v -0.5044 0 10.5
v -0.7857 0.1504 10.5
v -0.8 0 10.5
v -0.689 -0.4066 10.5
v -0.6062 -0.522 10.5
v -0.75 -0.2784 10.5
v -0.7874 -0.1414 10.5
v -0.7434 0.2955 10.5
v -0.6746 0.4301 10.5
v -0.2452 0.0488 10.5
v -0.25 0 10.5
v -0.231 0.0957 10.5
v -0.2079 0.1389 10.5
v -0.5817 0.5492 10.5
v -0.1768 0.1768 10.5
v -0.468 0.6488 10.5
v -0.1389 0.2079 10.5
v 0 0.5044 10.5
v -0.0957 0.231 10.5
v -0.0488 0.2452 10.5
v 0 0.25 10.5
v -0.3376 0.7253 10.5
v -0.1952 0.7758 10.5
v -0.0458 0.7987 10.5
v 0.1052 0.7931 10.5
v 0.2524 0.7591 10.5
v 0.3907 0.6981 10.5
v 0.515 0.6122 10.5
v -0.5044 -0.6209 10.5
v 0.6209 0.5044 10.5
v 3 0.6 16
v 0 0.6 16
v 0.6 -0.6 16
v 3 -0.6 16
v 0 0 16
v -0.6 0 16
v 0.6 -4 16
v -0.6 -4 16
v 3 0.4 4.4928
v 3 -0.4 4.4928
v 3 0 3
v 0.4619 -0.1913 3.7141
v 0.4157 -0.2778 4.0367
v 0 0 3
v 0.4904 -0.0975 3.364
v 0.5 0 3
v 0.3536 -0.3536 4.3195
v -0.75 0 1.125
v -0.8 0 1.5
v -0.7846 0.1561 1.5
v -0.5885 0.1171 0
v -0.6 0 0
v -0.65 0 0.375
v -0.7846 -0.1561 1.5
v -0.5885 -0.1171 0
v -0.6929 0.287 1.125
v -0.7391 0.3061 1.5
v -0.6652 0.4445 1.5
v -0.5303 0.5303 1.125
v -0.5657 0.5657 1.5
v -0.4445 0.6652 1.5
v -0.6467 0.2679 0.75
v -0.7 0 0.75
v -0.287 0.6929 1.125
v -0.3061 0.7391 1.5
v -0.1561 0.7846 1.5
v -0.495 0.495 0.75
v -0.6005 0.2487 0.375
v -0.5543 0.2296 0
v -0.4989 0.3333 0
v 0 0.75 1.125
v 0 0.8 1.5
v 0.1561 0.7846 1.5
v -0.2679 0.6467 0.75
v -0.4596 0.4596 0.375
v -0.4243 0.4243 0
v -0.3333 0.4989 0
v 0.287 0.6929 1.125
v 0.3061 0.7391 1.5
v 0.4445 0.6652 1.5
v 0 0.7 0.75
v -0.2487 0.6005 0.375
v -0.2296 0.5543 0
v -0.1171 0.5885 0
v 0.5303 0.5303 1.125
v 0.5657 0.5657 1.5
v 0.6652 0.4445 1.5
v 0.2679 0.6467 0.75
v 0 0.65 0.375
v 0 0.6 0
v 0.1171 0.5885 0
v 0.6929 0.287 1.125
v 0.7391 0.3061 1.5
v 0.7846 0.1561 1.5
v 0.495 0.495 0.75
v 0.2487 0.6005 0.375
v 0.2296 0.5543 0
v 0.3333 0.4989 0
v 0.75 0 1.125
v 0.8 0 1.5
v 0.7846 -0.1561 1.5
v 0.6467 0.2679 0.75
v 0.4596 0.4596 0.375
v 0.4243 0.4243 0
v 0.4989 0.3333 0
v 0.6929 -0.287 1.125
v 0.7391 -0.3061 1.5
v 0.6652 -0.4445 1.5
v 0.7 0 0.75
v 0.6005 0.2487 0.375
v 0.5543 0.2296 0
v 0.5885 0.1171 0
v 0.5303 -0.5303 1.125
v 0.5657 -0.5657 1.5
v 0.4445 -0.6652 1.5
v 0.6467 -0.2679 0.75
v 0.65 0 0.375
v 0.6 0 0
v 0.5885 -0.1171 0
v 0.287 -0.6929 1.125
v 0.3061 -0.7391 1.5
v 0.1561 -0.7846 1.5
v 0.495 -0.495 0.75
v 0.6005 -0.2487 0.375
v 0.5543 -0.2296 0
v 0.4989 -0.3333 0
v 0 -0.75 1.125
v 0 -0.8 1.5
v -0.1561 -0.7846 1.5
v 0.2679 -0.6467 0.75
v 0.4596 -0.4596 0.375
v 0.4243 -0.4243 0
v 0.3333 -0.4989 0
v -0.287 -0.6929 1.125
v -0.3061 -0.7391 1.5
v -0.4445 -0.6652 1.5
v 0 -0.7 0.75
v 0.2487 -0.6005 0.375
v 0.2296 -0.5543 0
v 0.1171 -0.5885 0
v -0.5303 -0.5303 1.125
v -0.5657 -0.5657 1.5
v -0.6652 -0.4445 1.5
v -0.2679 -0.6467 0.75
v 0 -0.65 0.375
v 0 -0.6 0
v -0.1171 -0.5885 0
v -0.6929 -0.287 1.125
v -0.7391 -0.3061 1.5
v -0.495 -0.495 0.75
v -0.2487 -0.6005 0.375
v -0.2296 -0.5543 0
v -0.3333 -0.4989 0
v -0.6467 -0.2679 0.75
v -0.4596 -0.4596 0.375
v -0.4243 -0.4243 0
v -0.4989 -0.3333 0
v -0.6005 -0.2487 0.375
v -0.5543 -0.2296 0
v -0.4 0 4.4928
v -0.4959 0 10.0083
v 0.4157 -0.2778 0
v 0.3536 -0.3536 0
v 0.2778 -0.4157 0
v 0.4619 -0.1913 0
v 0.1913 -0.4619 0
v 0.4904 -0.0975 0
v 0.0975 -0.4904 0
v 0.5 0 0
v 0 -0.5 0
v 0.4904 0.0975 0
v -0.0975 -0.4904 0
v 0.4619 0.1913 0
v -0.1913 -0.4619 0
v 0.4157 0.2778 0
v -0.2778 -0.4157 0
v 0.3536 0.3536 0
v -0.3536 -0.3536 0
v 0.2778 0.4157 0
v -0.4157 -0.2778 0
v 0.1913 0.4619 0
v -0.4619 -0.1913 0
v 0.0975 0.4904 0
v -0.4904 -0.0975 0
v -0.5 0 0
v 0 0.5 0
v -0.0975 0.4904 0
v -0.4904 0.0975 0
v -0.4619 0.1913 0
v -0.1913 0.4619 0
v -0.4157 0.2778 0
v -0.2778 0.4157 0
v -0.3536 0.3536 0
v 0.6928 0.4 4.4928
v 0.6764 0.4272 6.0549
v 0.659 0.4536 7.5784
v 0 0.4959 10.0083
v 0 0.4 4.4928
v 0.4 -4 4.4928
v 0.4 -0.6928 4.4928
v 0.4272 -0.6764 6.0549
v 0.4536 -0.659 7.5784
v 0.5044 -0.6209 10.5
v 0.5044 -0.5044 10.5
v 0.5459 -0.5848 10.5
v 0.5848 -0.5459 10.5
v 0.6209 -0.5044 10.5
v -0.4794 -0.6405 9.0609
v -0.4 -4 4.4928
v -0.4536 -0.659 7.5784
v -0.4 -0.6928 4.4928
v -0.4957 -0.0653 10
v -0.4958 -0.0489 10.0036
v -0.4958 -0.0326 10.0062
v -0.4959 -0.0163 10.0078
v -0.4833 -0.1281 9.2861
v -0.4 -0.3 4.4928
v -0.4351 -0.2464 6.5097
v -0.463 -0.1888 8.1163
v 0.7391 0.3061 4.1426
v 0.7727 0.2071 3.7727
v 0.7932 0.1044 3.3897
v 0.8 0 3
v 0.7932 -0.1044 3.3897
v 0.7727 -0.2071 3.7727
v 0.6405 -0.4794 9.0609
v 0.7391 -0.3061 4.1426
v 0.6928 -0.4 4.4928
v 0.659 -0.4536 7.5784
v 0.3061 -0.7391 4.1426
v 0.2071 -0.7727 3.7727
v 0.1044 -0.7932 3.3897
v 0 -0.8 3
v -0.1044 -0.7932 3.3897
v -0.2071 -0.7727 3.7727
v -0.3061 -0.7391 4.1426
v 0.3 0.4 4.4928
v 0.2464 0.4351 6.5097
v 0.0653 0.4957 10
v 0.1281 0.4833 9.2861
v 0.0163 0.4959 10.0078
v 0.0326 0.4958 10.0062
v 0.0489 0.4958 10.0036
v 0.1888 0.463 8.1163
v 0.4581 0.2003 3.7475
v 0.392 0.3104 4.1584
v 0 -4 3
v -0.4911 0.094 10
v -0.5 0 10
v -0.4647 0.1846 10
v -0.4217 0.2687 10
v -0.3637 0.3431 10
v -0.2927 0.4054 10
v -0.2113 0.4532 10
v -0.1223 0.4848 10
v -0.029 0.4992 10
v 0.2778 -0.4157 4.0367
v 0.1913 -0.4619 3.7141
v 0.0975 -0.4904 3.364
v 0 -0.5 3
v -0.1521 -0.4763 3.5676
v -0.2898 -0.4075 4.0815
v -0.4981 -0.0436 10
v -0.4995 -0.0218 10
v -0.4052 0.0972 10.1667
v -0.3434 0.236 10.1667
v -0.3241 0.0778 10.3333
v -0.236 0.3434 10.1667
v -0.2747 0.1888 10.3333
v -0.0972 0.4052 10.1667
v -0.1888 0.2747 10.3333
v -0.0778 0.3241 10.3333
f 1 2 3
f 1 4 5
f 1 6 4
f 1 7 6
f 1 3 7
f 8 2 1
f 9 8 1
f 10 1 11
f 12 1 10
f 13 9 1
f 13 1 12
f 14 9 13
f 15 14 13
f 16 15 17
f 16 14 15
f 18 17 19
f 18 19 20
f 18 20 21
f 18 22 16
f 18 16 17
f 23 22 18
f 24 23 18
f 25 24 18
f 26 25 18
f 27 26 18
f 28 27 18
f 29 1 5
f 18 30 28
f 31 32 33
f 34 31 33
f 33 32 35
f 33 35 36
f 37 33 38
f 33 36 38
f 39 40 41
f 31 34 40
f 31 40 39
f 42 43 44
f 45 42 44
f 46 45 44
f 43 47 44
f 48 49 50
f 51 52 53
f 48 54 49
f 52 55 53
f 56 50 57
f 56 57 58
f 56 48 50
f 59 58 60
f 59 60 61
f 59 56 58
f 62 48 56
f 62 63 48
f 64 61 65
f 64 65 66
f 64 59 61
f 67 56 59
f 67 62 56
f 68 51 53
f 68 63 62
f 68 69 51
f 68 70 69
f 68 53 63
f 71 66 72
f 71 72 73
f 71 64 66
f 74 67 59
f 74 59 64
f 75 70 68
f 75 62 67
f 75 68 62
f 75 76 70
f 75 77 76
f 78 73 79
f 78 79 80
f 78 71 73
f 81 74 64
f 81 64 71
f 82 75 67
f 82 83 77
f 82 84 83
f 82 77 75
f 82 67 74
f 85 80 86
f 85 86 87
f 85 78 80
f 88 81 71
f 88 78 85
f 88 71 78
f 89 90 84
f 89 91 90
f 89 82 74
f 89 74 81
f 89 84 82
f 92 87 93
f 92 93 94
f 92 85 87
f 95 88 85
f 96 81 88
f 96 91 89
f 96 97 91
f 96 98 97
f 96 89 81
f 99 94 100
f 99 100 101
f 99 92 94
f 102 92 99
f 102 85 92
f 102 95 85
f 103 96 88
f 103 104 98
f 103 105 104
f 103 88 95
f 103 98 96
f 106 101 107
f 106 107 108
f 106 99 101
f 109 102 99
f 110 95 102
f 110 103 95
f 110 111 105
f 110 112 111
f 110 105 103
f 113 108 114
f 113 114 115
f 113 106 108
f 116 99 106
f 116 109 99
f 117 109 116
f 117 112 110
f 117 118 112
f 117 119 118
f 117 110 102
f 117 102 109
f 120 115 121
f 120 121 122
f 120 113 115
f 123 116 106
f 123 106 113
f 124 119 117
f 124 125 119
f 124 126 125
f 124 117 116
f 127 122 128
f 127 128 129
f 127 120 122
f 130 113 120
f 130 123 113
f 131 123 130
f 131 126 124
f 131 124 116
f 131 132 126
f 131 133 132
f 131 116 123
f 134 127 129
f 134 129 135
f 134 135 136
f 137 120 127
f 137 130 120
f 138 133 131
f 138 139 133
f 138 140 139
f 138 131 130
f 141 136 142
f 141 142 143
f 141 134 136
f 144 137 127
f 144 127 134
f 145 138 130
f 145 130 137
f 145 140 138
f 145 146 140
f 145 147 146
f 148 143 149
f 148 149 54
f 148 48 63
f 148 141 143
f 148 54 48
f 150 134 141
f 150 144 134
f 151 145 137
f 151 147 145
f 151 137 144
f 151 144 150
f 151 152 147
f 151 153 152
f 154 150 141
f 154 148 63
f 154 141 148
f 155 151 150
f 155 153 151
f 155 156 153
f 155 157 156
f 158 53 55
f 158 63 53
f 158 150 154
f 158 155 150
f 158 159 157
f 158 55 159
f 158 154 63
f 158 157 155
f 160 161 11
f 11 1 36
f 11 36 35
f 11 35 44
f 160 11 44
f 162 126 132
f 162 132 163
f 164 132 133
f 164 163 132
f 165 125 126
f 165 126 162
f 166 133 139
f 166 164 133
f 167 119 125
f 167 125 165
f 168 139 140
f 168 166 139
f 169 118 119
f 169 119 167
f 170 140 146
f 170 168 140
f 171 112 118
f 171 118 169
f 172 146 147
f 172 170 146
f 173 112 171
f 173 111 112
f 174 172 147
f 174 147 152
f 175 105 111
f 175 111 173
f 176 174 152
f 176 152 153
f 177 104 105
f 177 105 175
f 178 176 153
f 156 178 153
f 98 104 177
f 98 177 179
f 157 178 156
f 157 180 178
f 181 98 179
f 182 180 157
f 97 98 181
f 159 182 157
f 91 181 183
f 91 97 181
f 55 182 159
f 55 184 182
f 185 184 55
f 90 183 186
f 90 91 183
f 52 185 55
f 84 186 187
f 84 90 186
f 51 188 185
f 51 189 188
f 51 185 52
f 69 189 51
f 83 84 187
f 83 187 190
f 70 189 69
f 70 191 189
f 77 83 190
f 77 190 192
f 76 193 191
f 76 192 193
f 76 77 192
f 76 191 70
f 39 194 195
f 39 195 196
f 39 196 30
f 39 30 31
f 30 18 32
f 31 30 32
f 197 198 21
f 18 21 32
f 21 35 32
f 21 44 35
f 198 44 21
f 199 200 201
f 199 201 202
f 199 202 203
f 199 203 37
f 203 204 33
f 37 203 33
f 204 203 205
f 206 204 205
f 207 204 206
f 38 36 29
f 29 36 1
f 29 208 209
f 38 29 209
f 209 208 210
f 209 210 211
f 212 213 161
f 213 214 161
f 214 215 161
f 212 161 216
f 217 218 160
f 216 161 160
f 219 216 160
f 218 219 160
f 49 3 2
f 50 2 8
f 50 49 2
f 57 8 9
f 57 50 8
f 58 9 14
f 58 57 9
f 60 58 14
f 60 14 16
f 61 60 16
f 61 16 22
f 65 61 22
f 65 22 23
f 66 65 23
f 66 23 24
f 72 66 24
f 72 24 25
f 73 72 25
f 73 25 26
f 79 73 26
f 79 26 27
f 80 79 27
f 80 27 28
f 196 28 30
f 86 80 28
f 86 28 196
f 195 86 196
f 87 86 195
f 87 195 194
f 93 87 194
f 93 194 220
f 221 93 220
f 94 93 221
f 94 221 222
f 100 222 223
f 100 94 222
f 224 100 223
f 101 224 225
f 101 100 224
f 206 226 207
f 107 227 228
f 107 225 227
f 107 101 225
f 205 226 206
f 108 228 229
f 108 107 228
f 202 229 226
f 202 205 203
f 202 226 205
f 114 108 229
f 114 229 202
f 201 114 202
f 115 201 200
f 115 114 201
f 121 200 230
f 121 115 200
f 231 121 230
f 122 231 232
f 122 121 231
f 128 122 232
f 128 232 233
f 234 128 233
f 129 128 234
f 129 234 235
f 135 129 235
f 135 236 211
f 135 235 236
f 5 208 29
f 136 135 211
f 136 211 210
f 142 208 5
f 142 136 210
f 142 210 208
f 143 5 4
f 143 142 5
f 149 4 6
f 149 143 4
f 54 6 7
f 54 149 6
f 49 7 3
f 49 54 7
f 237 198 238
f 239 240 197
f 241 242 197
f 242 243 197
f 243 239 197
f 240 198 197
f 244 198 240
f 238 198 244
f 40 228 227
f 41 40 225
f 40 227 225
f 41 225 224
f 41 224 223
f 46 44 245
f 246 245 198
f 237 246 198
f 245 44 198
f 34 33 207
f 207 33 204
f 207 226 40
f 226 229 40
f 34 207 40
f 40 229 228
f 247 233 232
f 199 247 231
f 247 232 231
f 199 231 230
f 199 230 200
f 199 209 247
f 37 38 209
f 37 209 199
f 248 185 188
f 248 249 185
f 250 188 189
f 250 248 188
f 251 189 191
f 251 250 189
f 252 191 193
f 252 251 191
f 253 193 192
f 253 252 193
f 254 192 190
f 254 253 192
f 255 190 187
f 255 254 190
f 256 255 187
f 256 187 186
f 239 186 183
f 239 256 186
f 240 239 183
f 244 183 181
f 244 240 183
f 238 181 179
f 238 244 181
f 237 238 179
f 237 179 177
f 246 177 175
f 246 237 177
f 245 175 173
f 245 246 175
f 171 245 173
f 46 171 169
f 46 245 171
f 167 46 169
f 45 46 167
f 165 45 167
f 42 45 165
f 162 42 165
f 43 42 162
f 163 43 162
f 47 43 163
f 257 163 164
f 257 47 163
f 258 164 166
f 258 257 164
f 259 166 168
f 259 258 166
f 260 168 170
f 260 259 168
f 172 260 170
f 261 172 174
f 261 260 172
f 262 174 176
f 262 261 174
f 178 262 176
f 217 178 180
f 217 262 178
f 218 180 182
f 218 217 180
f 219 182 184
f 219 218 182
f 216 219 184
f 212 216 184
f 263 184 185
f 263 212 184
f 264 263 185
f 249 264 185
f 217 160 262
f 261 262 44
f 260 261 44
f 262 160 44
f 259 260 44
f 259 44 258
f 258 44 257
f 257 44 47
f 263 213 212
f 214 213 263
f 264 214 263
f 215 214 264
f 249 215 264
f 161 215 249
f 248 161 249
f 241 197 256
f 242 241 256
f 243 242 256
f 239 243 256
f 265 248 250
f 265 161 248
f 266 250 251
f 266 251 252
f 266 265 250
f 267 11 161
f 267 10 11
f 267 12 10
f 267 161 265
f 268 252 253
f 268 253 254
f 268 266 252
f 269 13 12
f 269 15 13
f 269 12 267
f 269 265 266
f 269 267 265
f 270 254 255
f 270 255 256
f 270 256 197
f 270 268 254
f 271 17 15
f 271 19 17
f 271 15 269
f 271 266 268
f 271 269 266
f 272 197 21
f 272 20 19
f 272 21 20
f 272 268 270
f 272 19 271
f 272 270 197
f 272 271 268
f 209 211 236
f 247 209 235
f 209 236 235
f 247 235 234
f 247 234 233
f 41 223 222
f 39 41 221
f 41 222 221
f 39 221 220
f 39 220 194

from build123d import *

# Parameters (mm, degrees)
F3_DEPTH = 4
F5_DEPTH = 3


with BuildPart() as f1:
    # F0 (on Front) → F1 (revolve)
    with BuildSketch(Plane.XZ):
        Polygon((-0.25, 10.5), (-0.8, 10.5), (-0.8, 1.5), (-0.6, 0), (-0.5, 0), (-0.5, 10), align=None)
    revolve(axis=Axis((0, 0, 5.25), (0, 0, -1)))

    # F2 (on Front) → F3 (join)
    with BuildSketch(Plane.XZ):
        Polygon((0.6, 16), (-0.6, 16), (-0.4, 4.49282), (0, 3), (0.4, 4.49282), align=None)
    extrude(amount=F3_DEPTH)

    # F4 (on Right) → F5 (join)
    with BuildSketch(Plane.YZ):
        Polygon((0.6, 16), (-0.6, 16), (-0.4, 4.49282), (0, 3), (0.4, 4.49282), align=None)
    extrude(amount=F5_DEPTH)


solid = f1.part
